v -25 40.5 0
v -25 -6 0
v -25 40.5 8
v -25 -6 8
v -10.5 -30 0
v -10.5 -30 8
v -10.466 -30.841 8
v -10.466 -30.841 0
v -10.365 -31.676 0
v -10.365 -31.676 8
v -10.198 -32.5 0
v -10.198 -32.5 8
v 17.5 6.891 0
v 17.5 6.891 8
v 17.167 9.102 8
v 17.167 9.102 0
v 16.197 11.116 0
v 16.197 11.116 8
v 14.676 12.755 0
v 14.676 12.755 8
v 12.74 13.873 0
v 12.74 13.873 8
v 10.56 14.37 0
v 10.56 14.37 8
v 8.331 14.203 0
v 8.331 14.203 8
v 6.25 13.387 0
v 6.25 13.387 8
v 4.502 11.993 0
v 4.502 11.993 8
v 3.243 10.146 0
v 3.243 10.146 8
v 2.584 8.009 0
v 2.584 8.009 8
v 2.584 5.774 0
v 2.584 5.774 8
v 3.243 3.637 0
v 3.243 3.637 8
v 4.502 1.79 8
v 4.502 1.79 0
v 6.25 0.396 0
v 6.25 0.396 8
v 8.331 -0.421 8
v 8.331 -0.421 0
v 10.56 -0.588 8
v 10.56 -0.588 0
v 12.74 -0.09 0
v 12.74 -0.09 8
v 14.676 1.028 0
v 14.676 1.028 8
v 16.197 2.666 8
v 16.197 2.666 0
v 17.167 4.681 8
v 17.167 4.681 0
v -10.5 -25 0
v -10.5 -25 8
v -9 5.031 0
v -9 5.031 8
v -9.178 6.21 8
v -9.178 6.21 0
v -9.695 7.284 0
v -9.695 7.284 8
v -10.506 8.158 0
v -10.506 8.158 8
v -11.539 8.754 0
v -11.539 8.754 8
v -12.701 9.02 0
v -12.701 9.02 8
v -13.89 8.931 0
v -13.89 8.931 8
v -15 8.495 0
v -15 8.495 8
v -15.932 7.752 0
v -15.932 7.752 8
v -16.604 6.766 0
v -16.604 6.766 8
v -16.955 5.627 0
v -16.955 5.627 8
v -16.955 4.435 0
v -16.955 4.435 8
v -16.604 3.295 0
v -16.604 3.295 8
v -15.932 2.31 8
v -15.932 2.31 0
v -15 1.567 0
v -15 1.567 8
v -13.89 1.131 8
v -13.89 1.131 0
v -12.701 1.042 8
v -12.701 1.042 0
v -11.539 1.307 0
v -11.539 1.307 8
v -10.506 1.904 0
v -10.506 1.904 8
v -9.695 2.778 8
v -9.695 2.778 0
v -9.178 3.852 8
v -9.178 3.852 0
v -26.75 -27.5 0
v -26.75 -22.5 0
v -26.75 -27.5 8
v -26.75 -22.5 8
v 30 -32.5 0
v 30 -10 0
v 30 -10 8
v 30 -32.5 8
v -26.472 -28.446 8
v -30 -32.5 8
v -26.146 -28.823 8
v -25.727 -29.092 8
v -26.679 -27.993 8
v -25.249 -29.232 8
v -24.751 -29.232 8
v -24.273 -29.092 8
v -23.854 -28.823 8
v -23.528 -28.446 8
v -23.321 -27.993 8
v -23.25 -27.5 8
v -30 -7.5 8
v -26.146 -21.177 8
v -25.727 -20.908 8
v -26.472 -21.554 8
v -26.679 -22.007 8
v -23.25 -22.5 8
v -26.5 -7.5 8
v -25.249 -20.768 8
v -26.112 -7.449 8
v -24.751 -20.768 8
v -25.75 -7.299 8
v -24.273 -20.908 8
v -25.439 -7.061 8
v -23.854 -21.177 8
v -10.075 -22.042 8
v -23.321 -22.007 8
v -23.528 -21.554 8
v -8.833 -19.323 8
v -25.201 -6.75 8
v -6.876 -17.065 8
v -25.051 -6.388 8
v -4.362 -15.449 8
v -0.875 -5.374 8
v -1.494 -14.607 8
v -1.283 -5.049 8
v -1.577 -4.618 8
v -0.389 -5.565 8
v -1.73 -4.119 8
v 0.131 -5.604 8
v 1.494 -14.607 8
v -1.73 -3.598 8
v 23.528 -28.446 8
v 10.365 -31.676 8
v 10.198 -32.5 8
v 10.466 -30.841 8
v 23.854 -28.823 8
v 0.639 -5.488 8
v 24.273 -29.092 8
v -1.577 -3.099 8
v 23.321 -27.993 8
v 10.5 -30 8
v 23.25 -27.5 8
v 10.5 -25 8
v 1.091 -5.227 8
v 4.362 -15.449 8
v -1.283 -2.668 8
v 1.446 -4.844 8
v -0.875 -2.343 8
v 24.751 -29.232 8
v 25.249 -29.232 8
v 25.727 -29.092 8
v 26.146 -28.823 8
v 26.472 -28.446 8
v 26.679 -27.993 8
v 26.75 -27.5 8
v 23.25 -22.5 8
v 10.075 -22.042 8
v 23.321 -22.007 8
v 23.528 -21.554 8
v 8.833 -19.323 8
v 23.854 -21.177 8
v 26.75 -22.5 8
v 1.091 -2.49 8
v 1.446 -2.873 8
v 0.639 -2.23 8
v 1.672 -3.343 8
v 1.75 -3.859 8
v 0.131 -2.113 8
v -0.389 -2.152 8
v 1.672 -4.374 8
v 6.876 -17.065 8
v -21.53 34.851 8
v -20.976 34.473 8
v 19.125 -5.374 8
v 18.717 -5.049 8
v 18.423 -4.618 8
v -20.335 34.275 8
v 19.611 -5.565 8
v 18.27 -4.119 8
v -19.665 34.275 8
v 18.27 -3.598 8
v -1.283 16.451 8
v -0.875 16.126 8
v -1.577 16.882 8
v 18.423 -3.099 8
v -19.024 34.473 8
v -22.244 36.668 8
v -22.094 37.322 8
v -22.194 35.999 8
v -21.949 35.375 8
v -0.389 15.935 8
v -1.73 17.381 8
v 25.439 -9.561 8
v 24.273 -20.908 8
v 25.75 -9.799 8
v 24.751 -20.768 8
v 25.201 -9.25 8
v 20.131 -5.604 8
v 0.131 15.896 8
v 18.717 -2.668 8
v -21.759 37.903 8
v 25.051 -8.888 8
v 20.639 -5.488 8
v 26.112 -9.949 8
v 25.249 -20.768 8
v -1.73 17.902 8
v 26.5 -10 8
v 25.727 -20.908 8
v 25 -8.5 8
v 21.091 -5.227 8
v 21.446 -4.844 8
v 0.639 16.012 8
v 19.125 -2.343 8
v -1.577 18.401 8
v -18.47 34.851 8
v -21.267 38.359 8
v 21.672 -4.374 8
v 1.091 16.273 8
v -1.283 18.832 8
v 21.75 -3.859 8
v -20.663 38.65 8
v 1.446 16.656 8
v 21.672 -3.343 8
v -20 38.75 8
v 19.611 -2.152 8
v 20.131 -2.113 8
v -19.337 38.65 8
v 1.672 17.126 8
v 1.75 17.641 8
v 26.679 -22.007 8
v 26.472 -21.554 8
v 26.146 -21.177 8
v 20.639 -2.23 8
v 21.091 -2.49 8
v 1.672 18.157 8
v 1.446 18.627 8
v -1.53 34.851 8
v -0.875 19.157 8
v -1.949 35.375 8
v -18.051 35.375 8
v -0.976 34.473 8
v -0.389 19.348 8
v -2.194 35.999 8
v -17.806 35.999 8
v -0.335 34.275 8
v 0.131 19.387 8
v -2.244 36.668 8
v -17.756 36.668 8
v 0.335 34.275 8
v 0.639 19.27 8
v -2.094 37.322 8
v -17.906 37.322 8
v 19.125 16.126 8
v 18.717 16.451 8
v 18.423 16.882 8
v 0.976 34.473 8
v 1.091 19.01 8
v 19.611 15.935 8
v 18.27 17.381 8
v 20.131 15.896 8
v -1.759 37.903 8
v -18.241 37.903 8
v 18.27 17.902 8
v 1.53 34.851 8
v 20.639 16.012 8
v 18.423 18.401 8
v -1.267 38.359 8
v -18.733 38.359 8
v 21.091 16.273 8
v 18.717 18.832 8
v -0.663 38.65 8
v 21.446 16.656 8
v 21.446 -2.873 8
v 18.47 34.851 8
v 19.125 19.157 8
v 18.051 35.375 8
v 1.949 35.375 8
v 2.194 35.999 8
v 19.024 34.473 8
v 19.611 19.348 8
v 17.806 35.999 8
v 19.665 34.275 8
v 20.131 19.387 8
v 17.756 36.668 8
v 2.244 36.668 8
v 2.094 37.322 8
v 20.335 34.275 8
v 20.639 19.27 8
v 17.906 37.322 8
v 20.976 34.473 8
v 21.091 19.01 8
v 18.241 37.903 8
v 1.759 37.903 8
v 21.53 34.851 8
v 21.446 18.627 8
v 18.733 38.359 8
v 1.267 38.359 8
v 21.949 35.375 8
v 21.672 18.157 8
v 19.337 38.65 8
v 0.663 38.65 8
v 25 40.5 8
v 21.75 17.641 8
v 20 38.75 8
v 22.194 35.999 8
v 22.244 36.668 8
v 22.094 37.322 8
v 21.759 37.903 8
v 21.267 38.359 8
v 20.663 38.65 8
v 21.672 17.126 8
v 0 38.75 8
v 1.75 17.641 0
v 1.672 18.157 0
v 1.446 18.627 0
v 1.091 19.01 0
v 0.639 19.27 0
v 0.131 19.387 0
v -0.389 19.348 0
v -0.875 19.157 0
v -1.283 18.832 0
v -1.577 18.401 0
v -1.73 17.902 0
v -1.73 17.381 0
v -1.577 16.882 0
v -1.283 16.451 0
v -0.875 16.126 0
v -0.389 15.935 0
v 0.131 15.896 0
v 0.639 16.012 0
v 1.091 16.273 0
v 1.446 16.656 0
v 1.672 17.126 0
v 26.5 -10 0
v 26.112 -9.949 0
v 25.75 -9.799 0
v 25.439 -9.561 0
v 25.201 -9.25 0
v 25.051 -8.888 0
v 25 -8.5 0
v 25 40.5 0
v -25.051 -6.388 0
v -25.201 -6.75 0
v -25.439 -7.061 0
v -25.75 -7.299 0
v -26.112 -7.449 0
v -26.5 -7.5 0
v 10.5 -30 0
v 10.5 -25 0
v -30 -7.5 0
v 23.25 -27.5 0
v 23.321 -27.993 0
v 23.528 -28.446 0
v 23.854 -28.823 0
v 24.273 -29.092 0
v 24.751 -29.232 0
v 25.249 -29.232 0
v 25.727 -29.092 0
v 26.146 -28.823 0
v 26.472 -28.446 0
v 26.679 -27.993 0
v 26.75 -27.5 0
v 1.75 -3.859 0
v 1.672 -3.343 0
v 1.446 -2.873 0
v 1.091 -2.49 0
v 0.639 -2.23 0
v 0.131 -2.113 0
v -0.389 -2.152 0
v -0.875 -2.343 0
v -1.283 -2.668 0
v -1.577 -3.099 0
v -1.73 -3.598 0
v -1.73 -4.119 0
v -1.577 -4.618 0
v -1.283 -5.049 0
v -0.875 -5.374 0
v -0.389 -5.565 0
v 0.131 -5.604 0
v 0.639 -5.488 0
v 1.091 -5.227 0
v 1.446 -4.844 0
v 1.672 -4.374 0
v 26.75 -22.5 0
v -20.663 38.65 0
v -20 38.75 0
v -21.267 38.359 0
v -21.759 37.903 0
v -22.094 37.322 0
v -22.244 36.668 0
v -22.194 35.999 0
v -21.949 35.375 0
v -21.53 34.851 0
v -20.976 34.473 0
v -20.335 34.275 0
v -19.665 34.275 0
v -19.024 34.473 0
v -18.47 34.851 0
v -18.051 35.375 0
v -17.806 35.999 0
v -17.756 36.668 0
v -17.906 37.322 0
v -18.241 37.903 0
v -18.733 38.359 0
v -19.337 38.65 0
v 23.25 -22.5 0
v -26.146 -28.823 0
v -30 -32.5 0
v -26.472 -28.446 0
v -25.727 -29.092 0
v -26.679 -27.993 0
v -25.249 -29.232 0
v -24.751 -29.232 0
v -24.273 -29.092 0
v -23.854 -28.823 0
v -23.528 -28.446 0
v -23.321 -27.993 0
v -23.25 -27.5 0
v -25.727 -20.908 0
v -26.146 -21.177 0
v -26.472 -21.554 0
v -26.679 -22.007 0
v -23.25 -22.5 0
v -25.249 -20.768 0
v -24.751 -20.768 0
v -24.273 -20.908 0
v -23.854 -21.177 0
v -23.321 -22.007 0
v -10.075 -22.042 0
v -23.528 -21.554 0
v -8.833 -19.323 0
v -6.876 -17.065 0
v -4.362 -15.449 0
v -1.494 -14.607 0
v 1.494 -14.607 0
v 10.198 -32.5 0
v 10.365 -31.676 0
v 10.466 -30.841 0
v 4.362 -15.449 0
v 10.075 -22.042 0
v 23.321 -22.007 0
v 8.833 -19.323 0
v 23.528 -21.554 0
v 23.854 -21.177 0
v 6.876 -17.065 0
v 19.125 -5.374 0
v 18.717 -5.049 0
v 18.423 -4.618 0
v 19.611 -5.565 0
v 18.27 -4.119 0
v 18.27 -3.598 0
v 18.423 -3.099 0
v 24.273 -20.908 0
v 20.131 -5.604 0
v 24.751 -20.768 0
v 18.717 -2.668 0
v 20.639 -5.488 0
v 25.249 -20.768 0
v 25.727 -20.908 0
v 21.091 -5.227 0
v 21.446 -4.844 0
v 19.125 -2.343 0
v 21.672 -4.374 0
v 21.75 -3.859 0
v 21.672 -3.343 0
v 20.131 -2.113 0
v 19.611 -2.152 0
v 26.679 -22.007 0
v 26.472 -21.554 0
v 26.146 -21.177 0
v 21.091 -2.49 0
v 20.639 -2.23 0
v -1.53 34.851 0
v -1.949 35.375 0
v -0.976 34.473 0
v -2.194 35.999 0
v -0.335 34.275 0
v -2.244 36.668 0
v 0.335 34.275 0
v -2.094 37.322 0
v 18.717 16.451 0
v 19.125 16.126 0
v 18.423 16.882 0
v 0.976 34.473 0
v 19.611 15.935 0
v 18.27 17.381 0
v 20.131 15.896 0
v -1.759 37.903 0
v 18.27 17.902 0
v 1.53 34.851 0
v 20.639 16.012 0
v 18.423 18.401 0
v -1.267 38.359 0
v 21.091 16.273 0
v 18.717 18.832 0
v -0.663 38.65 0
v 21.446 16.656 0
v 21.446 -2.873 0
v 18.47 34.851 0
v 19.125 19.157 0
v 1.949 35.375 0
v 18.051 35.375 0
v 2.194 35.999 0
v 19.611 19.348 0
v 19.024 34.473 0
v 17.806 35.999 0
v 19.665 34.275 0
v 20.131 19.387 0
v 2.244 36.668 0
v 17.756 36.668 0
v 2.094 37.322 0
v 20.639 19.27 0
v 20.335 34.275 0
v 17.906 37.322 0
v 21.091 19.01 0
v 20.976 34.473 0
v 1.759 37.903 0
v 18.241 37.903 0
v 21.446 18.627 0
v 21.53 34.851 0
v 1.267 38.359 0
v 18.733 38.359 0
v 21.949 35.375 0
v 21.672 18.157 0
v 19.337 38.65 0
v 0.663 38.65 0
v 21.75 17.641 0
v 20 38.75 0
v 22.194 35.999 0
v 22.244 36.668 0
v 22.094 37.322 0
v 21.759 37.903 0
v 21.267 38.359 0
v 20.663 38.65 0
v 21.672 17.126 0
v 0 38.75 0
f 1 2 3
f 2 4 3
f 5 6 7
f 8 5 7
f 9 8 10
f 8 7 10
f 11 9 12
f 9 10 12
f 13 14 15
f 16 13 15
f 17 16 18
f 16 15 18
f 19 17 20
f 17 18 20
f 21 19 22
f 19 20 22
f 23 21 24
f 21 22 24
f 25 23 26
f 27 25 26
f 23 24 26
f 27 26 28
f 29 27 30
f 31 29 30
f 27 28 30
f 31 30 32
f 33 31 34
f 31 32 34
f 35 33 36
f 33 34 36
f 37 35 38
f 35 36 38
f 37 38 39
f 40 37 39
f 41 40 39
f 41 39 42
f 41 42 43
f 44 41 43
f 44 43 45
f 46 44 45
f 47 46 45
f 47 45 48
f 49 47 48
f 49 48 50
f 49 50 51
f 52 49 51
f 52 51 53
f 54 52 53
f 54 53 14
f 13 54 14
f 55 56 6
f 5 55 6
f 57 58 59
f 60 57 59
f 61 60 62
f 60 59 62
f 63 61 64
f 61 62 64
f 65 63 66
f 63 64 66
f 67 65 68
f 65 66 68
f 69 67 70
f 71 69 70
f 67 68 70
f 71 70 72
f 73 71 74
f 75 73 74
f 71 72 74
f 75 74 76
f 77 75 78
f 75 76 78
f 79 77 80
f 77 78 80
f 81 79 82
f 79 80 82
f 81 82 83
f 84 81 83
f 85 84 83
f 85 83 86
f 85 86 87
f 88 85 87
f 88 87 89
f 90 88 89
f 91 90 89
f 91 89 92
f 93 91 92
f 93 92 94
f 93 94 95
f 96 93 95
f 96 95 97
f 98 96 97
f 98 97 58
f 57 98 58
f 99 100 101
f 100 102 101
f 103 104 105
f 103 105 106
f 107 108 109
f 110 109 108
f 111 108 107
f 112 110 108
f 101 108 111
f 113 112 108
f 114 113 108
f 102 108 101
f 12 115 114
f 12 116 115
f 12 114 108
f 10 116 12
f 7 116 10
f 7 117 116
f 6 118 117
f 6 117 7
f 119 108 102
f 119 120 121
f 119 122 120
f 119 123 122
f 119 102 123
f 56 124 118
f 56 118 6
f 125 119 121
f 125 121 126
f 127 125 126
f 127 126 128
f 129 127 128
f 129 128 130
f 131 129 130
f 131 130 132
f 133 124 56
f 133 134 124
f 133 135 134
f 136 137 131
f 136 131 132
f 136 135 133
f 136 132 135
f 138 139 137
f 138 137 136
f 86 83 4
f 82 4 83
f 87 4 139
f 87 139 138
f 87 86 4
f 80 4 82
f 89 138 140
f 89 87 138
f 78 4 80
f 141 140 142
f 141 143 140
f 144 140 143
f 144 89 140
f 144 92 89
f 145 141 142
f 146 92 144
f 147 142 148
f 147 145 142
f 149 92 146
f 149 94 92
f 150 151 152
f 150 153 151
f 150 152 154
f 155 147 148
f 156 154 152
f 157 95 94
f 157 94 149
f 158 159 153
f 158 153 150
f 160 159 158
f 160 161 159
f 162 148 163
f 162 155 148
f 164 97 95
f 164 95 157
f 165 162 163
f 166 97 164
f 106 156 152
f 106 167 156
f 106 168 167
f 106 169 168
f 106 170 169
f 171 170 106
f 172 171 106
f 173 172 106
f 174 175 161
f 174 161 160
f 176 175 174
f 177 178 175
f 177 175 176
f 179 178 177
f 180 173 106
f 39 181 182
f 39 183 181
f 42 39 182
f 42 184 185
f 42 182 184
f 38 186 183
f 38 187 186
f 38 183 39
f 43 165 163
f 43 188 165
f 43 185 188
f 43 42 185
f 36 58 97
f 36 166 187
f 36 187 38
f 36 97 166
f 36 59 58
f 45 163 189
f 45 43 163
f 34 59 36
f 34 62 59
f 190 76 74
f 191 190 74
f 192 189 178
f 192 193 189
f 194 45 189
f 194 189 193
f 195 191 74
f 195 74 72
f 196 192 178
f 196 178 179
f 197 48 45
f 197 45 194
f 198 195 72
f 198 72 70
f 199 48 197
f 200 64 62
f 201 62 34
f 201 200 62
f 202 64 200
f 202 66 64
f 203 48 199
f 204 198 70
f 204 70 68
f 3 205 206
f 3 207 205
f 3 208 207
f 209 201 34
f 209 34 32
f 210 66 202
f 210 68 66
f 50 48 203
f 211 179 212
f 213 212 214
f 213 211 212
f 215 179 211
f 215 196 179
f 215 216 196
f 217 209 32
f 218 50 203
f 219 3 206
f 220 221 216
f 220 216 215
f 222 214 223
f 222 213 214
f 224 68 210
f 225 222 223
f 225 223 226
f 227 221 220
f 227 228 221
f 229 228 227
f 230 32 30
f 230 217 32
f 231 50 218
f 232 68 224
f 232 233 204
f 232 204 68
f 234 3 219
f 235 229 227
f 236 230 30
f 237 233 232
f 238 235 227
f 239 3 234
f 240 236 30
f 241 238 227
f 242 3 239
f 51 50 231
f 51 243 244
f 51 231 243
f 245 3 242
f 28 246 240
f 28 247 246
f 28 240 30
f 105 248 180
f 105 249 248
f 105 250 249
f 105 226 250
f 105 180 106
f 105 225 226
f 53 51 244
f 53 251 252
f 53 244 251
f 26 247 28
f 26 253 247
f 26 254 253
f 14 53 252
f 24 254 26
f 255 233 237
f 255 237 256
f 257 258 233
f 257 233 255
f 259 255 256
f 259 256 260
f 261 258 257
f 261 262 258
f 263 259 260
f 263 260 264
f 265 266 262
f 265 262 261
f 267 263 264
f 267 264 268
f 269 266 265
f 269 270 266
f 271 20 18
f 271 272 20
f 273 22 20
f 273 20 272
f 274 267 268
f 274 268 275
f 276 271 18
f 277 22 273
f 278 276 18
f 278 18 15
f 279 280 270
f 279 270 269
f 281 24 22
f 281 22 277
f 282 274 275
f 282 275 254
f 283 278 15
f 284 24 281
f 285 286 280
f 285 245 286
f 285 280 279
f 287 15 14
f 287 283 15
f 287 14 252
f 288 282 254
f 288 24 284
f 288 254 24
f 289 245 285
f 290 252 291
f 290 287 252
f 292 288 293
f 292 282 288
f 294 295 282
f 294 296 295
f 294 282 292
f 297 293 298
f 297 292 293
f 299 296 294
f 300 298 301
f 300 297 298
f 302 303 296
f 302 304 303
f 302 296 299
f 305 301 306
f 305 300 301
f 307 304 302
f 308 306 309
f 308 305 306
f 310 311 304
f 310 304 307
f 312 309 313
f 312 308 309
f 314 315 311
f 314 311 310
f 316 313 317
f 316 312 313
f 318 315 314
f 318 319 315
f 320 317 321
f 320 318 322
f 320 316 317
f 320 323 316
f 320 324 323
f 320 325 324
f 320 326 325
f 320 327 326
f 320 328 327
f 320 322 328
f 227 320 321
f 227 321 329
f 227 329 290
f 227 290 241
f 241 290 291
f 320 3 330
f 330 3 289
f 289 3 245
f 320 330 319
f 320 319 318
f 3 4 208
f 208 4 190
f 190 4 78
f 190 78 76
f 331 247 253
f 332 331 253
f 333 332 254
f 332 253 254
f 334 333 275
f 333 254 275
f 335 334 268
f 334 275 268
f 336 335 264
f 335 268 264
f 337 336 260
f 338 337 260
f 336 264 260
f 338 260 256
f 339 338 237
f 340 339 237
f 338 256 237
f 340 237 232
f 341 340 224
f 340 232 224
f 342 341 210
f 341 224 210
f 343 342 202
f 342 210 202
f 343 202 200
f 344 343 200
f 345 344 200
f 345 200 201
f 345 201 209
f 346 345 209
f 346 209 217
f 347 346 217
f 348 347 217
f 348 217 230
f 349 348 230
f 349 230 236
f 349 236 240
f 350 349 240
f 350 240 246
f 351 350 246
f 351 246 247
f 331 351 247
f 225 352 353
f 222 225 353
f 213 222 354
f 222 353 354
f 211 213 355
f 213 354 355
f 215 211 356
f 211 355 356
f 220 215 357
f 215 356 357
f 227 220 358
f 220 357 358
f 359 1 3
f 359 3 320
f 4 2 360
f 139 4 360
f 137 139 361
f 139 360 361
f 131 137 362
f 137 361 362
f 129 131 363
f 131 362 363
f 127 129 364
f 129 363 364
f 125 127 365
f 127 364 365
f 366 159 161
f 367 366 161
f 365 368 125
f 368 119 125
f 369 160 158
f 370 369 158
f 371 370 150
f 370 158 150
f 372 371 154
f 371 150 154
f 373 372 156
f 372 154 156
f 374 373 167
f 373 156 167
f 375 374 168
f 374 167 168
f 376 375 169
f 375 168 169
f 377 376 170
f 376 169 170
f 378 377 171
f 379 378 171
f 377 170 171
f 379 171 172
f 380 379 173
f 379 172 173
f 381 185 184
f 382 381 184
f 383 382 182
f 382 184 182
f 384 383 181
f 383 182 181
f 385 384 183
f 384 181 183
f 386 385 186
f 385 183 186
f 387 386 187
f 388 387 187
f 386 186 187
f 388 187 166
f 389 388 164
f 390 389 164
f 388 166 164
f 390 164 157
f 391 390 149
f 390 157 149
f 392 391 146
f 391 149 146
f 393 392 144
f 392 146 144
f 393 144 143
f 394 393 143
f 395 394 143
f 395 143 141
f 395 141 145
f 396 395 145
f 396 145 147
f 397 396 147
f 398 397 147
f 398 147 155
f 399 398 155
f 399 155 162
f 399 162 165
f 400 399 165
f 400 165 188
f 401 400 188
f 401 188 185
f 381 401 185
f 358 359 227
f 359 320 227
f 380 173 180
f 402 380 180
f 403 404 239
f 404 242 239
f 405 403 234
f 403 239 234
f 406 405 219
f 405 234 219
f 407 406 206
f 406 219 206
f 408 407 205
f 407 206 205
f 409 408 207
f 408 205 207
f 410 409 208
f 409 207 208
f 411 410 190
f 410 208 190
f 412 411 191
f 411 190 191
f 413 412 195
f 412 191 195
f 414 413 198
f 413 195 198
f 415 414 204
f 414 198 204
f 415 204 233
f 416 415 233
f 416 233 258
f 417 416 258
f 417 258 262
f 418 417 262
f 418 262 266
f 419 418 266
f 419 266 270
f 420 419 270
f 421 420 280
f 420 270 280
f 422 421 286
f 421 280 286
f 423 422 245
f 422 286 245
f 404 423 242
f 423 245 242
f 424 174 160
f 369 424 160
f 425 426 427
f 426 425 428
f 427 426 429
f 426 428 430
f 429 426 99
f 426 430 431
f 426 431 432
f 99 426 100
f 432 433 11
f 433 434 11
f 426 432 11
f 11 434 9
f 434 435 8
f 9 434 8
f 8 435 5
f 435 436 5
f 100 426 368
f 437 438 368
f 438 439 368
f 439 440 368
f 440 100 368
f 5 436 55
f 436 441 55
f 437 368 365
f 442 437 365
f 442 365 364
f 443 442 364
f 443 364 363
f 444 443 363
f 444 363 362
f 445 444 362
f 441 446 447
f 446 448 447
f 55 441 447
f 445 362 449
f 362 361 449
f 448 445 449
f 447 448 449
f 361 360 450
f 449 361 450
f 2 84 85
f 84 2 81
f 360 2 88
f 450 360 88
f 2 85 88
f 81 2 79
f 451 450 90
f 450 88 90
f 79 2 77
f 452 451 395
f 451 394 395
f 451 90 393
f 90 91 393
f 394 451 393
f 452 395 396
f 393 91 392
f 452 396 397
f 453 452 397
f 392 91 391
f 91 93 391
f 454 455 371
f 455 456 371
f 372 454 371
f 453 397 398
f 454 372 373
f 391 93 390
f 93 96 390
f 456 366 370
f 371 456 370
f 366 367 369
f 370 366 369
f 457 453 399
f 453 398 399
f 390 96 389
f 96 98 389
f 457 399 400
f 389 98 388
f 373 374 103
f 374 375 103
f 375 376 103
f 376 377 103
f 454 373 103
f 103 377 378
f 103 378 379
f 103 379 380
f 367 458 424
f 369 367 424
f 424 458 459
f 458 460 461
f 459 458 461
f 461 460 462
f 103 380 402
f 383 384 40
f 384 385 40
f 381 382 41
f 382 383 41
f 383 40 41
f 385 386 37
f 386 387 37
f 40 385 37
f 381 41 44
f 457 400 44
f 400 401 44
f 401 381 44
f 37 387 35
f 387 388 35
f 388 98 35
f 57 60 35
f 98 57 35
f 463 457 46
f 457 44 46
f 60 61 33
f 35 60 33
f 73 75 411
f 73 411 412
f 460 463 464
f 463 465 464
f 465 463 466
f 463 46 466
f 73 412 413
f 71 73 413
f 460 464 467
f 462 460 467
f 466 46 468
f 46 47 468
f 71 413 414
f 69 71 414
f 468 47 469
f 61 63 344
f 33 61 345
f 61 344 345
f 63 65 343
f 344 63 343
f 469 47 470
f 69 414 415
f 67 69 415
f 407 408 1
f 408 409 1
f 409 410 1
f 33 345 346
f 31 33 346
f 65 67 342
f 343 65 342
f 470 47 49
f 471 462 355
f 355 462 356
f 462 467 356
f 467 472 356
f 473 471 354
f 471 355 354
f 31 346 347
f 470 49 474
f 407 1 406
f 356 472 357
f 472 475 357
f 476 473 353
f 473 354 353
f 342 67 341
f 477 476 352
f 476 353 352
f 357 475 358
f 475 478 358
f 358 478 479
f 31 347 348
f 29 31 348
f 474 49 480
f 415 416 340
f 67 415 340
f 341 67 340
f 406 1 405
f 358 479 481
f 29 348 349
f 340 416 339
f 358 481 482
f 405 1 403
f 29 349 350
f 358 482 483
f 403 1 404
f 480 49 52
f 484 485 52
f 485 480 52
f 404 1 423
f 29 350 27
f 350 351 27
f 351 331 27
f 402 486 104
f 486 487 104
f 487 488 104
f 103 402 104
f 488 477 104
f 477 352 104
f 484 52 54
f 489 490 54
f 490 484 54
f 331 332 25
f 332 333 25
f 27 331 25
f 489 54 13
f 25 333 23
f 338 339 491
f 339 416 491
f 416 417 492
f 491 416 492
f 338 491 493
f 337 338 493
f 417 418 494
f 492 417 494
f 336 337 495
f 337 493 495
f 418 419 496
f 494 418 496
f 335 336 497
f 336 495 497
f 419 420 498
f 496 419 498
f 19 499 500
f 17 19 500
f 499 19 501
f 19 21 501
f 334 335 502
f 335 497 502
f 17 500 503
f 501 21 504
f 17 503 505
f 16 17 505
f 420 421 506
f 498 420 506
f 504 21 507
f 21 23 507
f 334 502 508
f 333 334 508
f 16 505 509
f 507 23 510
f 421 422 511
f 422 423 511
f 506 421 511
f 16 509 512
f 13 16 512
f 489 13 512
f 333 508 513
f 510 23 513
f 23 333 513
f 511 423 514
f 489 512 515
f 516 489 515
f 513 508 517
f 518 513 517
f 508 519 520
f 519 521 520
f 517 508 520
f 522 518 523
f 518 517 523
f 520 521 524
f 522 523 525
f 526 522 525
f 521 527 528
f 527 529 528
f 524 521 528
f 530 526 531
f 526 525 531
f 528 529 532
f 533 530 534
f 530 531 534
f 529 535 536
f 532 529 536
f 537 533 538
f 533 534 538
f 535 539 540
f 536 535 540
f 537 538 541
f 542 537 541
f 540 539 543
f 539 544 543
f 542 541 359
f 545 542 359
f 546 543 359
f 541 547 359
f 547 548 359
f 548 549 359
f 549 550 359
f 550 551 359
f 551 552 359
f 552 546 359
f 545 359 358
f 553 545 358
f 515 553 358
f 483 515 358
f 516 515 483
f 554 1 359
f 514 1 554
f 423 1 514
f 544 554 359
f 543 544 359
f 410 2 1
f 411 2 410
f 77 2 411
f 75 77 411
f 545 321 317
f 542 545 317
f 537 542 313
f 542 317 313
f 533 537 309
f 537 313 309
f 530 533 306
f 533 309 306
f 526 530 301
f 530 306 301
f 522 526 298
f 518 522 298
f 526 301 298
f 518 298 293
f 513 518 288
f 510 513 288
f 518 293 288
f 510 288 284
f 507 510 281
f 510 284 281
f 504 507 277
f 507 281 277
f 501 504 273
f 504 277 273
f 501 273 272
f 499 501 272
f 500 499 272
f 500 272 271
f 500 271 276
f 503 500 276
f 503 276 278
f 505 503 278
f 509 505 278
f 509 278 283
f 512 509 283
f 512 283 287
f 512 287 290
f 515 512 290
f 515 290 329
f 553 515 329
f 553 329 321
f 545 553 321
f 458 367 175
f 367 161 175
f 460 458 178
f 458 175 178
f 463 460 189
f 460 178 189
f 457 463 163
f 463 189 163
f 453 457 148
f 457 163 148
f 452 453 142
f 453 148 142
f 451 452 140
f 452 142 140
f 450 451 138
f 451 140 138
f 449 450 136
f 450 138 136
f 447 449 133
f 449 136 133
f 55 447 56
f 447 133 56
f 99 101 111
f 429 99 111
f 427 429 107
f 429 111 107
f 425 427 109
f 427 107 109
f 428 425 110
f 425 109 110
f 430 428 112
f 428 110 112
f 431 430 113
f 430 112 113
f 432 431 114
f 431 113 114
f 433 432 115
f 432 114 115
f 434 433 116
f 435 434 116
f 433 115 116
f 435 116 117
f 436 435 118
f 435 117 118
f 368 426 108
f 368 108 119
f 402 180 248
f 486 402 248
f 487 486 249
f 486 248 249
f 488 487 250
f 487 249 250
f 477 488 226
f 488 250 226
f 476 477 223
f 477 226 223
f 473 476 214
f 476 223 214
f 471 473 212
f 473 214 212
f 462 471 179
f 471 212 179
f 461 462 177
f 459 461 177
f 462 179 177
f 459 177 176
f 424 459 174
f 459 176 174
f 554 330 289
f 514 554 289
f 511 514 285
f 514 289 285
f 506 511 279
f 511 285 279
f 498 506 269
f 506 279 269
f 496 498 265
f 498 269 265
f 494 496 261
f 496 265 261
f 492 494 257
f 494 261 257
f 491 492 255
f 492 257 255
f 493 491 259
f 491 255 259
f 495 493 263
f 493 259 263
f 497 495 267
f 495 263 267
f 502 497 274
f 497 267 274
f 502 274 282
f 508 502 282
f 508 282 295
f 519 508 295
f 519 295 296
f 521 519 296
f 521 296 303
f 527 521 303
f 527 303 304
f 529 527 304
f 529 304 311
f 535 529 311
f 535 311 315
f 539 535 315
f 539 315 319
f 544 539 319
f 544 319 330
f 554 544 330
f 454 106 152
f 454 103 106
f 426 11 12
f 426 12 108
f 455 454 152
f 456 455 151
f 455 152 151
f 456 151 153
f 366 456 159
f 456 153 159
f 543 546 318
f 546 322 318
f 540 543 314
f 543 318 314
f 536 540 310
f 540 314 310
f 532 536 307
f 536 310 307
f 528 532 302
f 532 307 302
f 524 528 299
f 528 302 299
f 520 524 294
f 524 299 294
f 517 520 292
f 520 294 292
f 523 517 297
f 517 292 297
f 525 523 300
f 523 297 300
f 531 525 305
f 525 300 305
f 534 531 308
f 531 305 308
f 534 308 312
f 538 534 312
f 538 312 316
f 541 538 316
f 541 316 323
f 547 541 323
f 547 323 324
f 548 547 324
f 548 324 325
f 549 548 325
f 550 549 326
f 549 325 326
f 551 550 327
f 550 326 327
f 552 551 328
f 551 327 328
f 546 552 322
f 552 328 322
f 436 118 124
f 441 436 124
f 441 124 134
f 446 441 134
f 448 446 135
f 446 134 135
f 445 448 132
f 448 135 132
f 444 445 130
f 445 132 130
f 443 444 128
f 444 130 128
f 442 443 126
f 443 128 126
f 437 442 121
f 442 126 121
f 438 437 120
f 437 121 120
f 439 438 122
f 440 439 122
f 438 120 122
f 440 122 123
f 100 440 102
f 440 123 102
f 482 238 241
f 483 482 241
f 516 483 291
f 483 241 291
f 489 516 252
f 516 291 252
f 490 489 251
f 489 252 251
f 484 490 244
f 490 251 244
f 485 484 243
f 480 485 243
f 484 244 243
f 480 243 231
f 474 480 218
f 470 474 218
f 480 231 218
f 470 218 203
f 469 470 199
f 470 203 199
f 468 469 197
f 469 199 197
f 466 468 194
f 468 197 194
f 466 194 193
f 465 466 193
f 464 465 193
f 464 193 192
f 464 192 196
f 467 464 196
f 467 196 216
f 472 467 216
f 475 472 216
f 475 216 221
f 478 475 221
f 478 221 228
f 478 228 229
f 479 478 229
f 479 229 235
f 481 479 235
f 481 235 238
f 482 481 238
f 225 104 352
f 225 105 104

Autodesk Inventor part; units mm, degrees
ref_plane "YZ Plane" through (0, 0, 0) normal (1, 0, 0) x (0, 1, 0)
ref_plane "XZ Plane" through (0, 0, 0) normal (0, 1, 0) x (-1, 0, 0)
ref_plane "XY Plane" through (0, 0, 0) normal (0, 0, 1) x (1, 0, 0)
sketch "Sketch1" plane through (0, 0, 0) normal (0, 0, 1) x (1, 0, 0)
  line L0 (-30, 32.5) -> (30, 32.5)
  line L1 (30, 32.5) -> (30, -32.5)
  line L2 (30, -32.5) -> (-30, -32.5)
  line L3 (-30, -32.5) -> (-30, 32.5)
  point P0 (0, 0)
  point P1 (0, 32.5)
  point P2 (-30, 0)
  dimension "d0" = 60
  dimension "d1" = 65
extrude "Extrusion1" add sketch "Sketch1" along normal blind 8
sketch "Sketch4" plane through (0, 0, 8) normal (0, 0, 1) x (1, 0, 0)
  circle A0 centre (-25, -15) radius 1.75
  circle A1 centre (25, -15) radius 1.75
  circle A2 centre (25, -25) radius 1.75
  arc A3 (-10.5, -30) -> (10.5, -30) centre (0, -30) ccw
  line L0 (10.5, -30) -> (10.5, -25)
  arc A4 (10.5, -25) -> (-10.5, -25) centre (0, -25) ccw
  line L1 (-10.5, -25) -> (-10.5, -30)
  line L2 (30, -10) -> (30, -50)
  line L3 (30, -50) -> (-30, -50)
  line L4 (-30, -50) -> (-30, -10)
  line L5 (-30, -10) -> (30, -10)
  line L6 (25, -27.5) -> (25, -22.5) construction
  line L7 (26.75, -27.5) -> (26.75, -22.5)
  line L8 (23.25, -22.5) -> (23.25, -27.5)
  arc A5 (23.25, -27.5) -> (26.75, -27.5) centre (25, -27.5) ccw
  arc A6 (26.75, -22.5) -> (23.25, -22.5) centre (25, -22.5) ccw
  line L9 (-25, -27.5) -> (-25, -22.5) construction
  line L10 (-23.25, -27.5) -> (-23.25, -22.5)
  line L11 (-26.75, -22.5) -> (-26.75, -27.5)
  arc A7 (-26.75, -27.5) -> (-23.25, -27.5) centre (-25, -27.5) ccw
  arc A8 (-23.25, -22.5) -> (-26.75, -22.5) centre (-25, -22.5) ccw
  line L12 (-30, -32.5) -> (30, -32.5) projected
  point P0 (0, 0)
  point P1 (-25, -25)
  point P2 (26.75, -25)
  point P3 (23.25, -25)
  dimension "d22" = 5
  dimension "d23" = 3.5
  dimension "d24" = 5
  dimension "d25" = 10.5
  dimension "d26" = 7.5
  dimension "d27" = 30
extrude "Extrusion4" cut sketch "Sketch4" against normal blind 10 contours A2 | L7 A5 L8 A2 | A2 L8 A6 L7 | L1 A4 L0 A3 L12 | L12 A3 | A7 L11 A8 L10
sketch "Sketch5" plane through (0, 0, 8) normal (0, 0, 1) x (1, 0, 0)
  circle A0 centre (10, 6.8914) radius 7.5
  line L0 (30, 32.5) -> (-30, 32.5) projected
  line L1 (30, -32.5) -> (30, 32.5) projected
  point P0 (0, 0)
  dimension "d13" = 15
  dimension "d28" = 25.6086
  dimension "d29" = 20
extrude "Extrusion5" cut sketch "Sketch5" against normal through all
sketch "Sketch6" plane through (0, 0, 8) normal (0, 0, 1) x (1, 0, 0)
  circle A0 centre (20, 17.6414) radius 1.75
  circle A1 centre (0, 17.6414) radius 1.75
  circle A2 centre (0, -3.8586) radius 1.75
  circle A3 centre (20, -3.8586) radius 1.75
  line L0 (0, 17.6414) -> (20, 17.6414) construction
  line L1 (20, 17.6414) -> (20, -3.8586) construction
  line L2 (20, -3.8586) -> (0, -3.8586) construction
  line L3 (0, -3.8586) -> (0, 17.6414) construction
  line L4 (30, -32.5) -> (30, 32.5) construction
  line L5 (30, 32.5) -> (-30, 32.5) construction
  circle A4 centre (10, 6.8914) radius 7.5 projected
  point P0 (0, 0)
  point P1 (10, -3.8586)
  point P2 (20, 6.8914)
  dimension "d31" = 21.5
  dimension "d33" = 3.5
  dimension "d42" = 20
extrude "Extrusion6" cut sketch "Sketch6" against normal through all contours A0 | A1 | A2 | A3
sketch "Sketch7" plane through (0, 0, 8) normal (0, 0, 1) x (1, 0, 0)
  line L0 (-30, 32.5) -> (-30, -32.5) projected
  line L1 (-30, -7.5) -> (-25, -7.5)
  line L2 (-25, -7.5) -> (-25, 32.5)
  line L3 (-25, 32.5) -> (-30, 32.5)
  line L4 (-30, 32.5) -> (-30, -7.5)
  line L5 (30, 32.5) -> (-30, 32.5) projected
  line L6 (30, -10) -> (-30, -10) projected
  line L7 (25, -10) -> (30, -10)
  line L8 (30, -10) -> (30, 32.5)
  line L9 (30, 32.5) -> (25, 32.5)
  line L10 (25, 32.5) -> (25, -10)
  line L11 (30, -32.5) -> (30, 32.5) projected
  point P0 (0, 0)
  point P1 (25, -10)
  dimension "d18" = 5
  dimension "d19" = 5
  dimension "d43" = 40
extrude "Extrusion7" cut sketch "Sketch7" against normal through all contours L3 L2 L1 L0 | L5 L8 L6 L10
sketch "Sketch8" plane through (0, 0, 8) normal (0, 0, 1) x (1, 0, 0)
  circle A0 centre (-13, 5.0309) radius 4
  line L0 (-30, -7.5) -> (-30, -32.5) projected
  line L1 (25, 32.5) -> (-25, 32.5) projected
  point P0 (0, 0)
  dimension "d35" = 8
  dimension "d36" = 17
  dimension "d37" = 27.4691
extrude "Extrusion8" cut sketch "Sketch8" against normal blind 10
move faces "Move1" translate (0, 8, 0) faces at (8.3333, 32.5, 2.6667)
sketch "Sketch9" plane through (0, 0, 0) normal (0, 0, -1) x (-1, 0, 0)
  line L0 (-25, 40.5) -> (25, 40.5) projected
  point P0 (0, 0)
  point P1 (0, 36.5)
  point P2 (-20, 36.5)
  point P3 (20, 36.5)
  dimension "d47" = 20
  dimension "d48" = 20
  dimension "d49" = 4
hole "Hole1" at (0, 36.5, 0) at (20, 36.5, 0) at (-20, 36.5, 0) direction (0, 0, 1) diameter 4.5 end through all
fillet "Fillet1" radius 1.5 2 edges at (25, -10, 4) (-25, -7.5, 4)
equation "\"d19\" = d18"
equation "\"d48\" = d47"
properties part number "0005-10-005"
